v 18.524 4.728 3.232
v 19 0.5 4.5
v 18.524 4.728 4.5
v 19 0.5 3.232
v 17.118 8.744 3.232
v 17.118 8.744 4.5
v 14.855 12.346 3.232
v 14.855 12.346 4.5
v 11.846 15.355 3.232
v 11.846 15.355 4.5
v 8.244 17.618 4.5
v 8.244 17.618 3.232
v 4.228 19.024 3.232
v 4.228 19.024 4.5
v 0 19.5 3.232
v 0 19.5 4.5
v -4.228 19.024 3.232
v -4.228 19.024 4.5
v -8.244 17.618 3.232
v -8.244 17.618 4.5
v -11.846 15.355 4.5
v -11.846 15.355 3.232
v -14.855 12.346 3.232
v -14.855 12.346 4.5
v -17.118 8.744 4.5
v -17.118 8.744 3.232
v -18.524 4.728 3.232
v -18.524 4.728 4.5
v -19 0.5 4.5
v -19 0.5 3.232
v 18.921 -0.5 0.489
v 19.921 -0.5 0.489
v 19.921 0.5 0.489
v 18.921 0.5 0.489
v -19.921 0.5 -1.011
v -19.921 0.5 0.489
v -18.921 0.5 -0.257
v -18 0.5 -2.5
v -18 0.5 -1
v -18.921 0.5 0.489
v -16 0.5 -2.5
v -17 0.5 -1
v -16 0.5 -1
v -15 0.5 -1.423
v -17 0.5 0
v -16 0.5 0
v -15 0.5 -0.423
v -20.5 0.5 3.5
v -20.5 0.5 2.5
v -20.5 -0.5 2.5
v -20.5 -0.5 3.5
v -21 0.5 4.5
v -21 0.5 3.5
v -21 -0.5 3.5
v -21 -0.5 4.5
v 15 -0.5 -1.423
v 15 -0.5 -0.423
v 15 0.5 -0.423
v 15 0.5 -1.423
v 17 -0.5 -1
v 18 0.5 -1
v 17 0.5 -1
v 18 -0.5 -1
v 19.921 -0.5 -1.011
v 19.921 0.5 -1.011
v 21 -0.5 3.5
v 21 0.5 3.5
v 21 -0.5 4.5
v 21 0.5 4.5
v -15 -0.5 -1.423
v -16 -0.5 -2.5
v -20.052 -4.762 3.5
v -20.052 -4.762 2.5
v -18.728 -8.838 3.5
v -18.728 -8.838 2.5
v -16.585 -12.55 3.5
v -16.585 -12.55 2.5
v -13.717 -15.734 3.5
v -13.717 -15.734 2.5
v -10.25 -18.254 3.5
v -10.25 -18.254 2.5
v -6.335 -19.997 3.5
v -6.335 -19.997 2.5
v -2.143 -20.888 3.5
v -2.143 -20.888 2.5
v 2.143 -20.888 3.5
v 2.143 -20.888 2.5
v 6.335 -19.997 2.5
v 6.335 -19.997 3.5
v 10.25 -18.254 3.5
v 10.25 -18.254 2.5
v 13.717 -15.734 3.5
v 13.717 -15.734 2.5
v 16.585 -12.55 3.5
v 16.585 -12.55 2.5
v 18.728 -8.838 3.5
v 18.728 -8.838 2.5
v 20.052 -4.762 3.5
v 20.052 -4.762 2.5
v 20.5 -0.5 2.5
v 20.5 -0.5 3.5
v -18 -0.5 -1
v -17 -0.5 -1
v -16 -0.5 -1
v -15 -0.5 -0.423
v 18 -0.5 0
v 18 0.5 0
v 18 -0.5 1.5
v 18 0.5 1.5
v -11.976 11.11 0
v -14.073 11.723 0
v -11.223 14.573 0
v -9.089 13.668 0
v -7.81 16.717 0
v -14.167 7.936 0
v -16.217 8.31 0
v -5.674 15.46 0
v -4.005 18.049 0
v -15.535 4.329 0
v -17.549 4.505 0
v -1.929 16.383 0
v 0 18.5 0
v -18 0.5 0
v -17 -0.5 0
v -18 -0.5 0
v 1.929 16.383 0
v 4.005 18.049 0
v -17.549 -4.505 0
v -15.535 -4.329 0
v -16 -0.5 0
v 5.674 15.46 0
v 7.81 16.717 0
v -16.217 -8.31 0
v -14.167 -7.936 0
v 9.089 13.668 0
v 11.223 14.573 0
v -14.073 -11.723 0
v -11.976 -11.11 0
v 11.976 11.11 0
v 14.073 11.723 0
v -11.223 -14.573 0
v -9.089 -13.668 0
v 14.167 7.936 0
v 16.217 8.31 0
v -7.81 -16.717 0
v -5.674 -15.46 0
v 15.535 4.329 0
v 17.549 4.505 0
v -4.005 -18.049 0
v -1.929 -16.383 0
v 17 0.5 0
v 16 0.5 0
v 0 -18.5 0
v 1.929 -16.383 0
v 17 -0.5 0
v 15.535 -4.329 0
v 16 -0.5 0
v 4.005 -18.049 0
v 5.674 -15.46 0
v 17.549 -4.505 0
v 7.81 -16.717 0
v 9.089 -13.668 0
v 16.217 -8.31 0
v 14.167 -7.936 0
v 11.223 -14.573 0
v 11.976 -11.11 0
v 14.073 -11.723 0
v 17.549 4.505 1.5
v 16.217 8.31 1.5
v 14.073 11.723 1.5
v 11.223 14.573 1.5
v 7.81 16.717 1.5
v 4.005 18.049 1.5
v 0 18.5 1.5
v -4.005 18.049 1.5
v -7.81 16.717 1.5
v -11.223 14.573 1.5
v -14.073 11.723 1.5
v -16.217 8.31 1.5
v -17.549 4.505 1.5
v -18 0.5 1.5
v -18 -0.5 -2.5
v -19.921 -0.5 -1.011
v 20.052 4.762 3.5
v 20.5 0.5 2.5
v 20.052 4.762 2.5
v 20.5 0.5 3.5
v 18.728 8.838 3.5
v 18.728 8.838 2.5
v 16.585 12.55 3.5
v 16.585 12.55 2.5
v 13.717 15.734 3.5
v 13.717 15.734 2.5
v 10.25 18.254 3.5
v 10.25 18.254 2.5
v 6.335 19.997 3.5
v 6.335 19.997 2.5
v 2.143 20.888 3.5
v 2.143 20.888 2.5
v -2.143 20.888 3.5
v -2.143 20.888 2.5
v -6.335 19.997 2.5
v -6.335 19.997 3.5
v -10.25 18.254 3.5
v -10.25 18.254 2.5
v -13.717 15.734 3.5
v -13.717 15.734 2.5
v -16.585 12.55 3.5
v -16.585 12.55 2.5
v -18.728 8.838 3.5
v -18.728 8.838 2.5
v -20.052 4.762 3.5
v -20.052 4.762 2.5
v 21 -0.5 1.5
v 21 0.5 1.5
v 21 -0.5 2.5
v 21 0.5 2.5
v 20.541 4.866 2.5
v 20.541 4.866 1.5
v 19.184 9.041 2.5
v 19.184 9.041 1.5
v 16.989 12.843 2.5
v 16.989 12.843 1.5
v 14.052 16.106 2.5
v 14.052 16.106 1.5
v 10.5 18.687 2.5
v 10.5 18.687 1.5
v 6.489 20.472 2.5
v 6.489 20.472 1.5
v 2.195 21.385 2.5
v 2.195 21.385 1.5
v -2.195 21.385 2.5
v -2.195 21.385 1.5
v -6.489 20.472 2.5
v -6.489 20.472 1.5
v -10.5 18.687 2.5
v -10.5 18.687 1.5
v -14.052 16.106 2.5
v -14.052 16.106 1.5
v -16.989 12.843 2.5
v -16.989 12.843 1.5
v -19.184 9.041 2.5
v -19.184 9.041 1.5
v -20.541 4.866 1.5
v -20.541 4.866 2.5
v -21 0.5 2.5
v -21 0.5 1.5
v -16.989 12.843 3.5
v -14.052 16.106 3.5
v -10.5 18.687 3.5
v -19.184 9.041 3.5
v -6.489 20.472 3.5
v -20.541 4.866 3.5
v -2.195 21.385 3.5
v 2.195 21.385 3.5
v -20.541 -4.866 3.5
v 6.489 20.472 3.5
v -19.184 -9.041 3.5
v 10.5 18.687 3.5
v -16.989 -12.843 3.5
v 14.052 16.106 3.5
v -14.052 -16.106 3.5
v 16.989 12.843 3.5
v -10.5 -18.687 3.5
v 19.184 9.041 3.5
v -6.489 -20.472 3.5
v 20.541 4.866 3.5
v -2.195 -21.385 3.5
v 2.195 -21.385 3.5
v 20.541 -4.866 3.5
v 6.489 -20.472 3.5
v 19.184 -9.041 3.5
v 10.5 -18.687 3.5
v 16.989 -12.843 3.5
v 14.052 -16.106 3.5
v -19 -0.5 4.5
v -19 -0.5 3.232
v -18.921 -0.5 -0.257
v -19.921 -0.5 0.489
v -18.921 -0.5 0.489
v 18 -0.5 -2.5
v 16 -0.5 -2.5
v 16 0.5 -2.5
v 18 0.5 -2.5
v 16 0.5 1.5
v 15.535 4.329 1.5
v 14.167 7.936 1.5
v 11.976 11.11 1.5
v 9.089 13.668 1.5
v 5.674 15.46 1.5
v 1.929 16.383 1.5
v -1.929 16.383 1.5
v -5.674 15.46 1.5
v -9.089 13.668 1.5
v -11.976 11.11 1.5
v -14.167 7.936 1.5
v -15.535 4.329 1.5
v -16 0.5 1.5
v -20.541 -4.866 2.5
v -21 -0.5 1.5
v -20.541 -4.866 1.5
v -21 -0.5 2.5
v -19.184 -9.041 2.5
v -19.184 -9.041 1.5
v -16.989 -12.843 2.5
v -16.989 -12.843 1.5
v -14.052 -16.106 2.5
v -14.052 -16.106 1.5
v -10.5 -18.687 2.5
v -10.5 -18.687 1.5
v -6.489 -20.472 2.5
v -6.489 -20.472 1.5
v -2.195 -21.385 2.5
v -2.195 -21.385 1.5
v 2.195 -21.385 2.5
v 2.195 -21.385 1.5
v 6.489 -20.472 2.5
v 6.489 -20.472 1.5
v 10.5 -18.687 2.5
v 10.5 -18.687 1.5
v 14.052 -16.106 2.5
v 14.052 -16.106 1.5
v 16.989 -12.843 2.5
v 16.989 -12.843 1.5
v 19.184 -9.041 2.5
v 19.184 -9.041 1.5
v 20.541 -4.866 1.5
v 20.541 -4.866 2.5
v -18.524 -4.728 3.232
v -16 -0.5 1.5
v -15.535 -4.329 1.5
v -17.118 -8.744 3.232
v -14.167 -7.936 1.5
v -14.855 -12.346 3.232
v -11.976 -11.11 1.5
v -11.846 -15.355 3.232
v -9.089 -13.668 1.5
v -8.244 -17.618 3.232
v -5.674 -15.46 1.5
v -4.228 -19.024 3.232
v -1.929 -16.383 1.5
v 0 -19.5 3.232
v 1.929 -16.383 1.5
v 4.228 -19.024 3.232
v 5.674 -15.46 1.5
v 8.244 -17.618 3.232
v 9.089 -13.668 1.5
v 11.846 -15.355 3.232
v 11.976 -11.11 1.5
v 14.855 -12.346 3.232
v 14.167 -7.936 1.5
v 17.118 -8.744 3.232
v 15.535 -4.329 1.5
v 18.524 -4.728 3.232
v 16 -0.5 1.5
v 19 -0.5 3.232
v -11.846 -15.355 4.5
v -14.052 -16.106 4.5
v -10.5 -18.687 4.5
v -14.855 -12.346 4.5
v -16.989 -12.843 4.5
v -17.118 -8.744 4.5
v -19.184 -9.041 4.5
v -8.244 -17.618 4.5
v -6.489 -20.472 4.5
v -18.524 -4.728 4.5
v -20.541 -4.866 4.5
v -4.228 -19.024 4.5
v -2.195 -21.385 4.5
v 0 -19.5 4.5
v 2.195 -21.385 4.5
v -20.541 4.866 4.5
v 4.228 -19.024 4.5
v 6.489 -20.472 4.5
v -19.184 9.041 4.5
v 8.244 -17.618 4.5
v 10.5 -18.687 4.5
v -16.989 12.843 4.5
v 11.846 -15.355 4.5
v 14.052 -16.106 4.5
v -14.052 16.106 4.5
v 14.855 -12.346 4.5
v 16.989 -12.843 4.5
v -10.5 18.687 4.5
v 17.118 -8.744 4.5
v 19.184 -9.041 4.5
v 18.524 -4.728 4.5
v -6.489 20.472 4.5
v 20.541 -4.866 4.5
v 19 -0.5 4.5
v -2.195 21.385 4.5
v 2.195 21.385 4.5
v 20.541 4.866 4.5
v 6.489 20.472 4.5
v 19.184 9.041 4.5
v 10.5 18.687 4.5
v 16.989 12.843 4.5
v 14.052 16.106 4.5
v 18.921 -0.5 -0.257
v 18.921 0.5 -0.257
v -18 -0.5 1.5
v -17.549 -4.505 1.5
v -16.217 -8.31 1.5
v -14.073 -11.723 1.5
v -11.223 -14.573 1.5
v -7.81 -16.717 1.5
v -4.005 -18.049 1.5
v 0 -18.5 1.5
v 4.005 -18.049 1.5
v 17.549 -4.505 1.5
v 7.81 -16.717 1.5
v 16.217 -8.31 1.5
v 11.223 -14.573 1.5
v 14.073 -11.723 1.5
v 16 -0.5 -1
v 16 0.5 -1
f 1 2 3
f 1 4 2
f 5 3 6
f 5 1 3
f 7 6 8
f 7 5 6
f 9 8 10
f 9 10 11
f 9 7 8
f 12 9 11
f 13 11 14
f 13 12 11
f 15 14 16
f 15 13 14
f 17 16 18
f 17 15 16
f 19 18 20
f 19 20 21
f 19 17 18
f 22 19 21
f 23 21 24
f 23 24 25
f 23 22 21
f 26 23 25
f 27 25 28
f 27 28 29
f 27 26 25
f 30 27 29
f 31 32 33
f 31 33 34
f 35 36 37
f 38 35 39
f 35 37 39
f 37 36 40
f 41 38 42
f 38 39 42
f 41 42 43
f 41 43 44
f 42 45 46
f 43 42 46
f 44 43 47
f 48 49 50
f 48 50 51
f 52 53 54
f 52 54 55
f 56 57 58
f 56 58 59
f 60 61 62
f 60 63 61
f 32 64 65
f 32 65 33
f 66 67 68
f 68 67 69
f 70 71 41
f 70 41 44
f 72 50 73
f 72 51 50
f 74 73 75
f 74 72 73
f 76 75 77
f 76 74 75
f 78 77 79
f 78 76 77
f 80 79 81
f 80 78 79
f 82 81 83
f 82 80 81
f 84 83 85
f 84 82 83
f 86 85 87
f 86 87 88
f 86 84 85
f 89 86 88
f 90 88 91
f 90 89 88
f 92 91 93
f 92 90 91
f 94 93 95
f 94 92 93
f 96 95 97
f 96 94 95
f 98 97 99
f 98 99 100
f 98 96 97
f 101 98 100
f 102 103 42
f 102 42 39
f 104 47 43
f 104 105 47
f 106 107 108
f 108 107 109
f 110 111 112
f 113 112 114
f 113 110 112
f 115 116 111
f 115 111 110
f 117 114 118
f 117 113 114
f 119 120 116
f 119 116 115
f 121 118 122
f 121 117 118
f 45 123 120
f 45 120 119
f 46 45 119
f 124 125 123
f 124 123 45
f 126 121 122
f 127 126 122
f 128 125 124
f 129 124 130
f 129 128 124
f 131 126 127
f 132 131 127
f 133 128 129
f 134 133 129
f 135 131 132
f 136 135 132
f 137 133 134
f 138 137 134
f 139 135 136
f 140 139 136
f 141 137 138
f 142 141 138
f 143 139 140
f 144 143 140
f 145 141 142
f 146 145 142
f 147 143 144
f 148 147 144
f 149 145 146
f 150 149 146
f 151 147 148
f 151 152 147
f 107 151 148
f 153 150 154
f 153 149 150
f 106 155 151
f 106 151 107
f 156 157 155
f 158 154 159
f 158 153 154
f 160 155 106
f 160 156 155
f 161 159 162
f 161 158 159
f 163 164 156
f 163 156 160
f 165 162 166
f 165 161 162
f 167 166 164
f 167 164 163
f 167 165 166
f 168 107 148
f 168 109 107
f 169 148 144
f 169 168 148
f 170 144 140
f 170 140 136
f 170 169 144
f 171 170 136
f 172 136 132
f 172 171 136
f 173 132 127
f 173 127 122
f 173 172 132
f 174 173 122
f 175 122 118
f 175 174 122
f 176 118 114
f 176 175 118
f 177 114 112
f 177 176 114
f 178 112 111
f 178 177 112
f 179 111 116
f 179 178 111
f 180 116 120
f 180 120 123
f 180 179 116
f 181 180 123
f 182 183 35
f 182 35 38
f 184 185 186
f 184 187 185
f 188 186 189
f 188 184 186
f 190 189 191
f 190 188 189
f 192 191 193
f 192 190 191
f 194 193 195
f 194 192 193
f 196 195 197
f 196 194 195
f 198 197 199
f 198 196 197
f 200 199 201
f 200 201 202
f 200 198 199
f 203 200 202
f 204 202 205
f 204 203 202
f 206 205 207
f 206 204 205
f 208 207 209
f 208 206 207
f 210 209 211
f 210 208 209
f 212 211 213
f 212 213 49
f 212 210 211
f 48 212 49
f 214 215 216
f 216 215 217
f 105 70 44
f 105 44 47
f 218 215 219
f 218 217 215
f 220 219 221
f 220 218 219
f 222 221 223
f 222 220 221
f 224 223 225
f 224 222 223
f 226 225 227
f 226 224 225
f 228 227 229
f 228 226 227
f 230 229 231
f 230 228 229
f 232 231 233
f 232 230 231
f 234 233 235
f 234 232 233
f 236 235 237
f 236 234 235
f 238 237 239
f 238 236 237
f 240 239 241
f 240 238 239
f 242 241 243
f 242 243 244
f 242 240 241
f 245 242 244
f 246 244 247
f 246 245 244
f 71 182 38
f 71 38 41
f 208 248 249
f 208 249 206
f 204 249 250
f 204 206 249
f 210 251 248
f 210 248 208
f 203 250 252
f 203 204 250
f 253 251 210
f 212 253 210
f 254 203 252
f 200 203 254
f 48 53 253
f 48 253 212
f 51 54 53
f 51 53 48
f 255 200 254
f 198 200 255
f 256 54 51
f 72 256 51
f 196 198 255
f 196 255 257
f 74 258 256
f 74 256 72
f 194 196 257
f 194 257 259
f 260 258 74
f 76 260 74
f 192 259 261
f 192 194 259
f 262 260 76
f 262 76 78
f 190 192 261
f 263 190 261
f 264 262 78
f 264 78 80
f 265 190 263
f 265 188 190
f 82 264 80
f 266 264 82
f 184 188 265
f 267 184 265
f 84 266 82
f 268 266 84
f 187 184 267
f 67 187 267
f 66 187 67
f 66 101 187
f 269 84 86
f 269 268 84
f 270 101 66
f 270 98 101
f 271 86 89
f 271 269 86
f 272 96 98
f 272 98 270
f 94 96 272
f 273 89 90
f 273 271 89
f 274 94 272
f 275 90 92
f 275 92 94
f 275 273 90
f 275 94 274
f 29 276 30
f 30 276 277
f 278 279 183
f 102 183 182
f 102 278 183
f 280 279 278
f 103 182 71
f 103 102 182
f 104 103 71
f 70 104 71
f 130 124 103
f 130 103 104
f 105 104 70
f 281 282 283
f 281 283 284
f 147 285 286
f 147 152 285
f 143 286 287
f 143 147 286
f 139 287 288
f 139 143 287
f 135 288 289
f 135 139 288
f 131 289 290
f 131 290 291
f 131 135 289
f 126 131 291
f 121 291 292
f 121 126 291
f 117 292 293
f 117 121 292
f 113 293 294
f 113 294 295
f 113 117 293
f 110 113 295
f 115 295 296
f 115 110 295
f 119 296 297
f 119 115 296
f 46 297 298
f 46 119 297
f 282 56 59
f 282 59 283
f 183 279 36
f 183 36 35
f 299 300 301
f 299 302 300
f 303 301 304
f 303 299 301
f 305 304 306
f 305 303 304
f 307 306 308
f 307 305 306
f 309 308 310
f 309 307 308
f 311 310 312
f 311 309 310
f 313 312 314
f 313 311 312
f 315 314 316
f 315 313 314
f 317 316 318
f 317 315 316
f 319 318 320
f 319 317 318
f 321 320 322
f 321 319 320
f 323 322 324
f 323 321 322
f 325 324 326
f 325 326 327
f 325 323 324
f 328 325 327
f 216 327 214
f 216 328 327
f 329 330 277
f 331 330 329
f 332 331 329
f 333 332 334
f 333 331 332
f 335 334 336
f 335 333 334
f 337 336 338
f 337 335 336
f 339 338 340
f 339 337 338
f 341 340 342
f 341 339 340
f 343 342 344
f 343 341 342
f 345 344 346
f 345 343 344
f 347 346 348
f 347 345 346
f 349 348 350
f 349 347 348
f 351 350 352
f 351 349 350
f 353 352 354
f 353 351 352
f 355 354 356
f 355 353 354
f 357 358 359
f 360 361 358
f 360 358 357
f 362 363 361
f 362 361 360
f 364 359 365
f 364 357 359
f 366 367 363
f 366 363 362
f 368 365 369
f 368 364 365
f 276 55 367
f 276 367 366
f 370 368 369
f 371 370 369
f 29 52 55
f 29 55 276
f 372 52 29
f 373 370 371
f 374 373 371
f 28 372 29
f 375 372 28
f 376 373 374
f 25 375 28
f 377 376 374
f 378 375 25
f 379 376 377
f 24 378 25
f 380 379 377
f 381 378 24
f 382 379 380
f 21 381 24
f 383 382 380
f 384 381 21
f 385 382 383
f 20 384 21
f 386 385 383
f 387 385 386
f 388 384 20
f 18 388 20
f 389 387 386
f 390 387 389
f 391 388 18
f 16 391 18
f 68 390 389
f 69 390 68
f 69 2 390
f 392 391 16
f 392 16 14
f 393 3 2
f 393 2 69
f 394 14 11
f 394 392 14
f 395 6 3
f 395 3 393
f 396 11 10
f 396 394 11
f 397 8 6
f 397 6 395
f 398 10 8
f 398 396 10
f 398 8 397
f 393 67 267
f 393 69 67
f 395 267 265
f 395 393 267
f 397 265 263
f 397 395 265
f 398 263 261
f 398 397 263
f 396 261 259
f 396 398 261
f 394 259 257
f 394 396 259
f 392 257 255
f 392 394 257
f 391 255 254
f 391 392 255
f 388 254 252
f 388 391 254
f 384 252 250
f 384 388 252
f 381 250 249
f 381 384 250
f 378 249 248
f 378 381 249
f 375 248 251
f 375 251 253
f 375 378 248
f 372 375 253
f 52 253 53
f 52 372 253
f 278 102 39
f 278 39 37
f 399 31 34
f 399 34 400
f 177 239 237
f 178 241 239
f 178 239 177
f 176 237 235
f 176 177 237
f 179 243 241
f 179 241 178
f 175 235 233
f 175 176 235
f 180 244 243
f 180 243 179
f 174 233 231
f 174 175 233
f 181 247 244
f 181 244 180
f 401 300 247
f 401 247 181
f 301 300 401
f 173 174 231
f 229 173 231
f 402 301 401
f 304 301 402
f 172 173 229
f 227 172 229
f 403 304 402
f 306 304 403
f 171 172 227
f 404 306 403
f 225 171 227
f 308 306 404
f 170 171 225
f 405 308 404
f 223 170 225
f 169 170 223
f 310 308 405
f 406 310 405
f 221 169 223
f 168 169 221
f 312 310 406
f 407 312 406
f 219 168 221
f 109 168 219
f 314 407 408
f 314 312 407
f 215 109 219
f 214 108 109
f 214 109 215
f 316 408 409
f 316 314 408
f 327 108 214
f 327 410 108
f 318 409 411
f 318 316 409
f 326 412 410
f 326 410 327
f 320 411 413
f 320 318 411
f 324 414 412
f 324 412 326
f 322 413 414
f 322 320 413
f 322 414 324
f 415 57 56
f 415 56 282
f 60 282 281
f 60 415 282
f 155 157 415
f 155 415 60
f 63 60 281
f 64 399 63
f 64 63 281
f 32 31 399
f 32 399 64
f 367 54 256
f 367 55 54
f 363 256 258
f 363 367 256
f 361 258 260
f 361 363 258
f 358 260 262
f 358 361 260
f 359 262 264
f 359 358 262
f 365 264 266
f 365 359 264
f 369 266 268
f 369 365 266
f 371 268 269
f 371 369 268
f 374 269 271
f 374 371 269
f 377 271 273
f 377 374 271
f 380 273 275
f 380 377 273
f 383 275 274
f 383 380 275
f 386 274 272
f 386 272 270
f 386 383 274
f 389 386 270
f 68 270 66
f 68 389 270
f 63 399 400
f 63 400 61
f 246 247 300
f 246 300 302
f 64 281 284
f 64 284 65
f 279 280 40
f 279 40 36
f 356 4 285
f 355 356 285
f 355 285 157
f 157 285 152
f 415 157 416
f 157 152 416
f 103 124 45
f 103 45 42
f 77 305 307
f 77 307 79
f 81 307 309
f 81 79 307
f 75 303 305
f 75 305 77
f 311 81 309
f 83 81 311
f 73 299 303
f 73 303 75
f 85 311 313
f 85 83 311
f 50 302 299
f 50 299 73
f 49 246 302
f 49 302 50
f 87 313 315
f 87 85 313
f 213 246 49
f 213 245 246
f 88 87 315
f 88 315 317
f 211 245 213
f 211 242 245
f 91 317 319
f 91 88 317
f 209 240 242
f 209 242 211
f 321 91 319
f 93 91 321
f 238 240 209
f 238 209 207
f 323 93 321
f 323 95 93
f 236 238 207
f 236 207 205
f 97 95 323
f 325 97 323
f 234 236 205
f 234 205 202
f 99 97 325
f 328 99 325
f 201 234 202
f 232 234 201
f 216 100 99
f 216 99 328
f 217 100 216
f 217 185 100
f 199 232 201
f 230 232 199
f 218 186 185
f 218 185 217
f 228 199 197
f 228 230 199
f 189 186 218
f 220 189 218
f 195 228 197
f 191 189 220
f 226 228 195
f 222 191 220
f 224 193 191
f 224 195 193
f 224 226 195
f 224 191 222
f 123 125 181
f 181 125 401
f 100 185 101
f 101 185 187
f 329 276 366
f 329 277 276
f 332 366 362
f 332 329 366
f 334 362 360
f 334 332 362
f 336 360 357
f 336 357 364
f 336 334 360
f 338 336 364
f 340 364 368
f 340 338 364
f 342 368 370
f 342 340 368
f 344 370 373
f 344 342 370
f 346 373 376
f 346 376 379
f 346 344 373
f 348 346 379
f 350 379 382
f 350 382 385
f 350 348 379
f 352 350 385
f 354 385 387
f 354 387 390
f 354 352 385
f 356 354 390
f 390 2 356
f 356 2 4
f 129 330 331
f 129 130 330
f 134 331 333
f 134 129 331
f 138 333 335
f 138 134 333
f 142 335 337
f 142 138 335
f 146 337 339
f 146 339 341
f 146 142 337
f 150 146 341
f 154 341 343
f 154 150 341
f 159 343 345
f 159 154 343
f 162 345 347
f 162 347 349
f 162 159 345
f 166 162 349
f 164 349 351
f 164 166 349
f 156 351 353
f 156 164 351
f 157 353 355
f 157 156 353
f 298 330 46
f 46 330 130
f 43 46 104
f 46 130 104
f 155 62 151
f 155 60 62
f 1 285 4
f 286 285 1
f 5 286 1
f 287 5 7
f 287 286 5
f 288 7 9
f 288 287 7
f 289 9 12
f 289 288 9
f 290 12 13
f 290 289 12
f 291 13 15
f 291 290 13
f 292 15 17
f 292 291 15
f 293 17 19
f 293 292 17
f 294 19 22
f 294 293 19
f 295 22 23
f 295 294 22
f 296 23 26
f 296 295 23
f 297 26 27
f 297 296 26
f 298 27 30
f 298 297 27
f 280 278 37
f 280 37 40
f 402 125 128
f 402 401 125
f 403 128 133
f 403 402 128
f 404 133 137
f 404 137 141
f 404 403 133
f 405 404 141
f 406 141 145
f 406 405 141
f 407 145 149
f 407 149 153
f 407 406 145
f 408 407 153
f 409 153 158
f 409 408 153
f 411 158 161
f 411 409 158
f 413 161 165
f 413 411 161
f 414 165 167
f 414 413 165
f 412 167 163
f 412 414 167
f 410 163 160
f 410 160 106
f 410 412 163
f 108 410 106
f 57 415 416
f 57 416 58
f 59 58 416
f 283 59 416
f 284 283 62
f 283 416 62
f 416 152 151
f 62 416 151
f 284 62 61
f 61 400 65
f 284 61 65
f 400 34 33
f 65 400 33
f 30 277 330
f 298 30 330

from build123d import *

# Parameters (mm, degrees)
F3_DEPTH = 0.5


with BuildPart() as f3:
    # F2 (on Front) → F3 (new body, symmetric)
    with BuildSketch(Plane.XZ):
        Polygon((-16, 0), (-17, 0), (-17, -1), (-18, -1), (-18.9205025733, -0.2568606869), (-18.9205025733, 0.4893779857), (-19.9205025733, 0.4893779857), (-19.9205025733, -1.0106220143), (-18, -2.5), (-17, -2.5), (-16, -2.5), (-15, -1.4226497308), (-15, -0.4226497308), (-16, -1), align=None)
    extrude(amount=F3_DEPTH, both=True)



with BuildPart() as f3b:
    # F2 (on Front) → F3, piece 2 (new body, symmetric)
    with BuildSketch(Plane.XZ):
        Polygon((17, 0), (16, 0), (16, -1), (15, -0.4226497308), (15, -1.4226497308), (16, -2.5), (17, -2.5), (18, -2.5), (19.9205025733, -1.0106220143), (19.9205025733, 0.4893779857), (18.9205025733, 0.4893779857), (18.9205025733, -0.2568606869), (18, -1), (17, -1), align=None)
    extrude(amount=F3_DEPTH, both=True)


with BuildPart() as f3_1:
    add(f3.part)

    add(f3b.part)  # F4 merges F3b
    # F4: sweep along a path in F0
    with BuildLine(Plane.XY) as f4_path:
        ThreePointArc((-16, -0.5), (0, -16.5), (16, -0.5))
        Line((16, -0.5), (16, 0.5))
        ThreePointArc((16, 0.5), (0, 16.5), (-16, 0.5))
        Line((-16, 0.5), (-16, -0.5))
    # F1 (on Front) → F4 (sweep)
    with BuildSketch(Plane.XZ):
        Polygon((16, 0), (18, 0), (18, 1.5), (21, 1.5), (21, 2.5), (20.5, 2.5), (20.5, 3.5), (21, 3.5), (21, 4.5), (19, 4.5), (19, 3.2320508076), (16, 1.5), align=None)
    sweep(path=f4_path.line)


solid = f3_1.part
